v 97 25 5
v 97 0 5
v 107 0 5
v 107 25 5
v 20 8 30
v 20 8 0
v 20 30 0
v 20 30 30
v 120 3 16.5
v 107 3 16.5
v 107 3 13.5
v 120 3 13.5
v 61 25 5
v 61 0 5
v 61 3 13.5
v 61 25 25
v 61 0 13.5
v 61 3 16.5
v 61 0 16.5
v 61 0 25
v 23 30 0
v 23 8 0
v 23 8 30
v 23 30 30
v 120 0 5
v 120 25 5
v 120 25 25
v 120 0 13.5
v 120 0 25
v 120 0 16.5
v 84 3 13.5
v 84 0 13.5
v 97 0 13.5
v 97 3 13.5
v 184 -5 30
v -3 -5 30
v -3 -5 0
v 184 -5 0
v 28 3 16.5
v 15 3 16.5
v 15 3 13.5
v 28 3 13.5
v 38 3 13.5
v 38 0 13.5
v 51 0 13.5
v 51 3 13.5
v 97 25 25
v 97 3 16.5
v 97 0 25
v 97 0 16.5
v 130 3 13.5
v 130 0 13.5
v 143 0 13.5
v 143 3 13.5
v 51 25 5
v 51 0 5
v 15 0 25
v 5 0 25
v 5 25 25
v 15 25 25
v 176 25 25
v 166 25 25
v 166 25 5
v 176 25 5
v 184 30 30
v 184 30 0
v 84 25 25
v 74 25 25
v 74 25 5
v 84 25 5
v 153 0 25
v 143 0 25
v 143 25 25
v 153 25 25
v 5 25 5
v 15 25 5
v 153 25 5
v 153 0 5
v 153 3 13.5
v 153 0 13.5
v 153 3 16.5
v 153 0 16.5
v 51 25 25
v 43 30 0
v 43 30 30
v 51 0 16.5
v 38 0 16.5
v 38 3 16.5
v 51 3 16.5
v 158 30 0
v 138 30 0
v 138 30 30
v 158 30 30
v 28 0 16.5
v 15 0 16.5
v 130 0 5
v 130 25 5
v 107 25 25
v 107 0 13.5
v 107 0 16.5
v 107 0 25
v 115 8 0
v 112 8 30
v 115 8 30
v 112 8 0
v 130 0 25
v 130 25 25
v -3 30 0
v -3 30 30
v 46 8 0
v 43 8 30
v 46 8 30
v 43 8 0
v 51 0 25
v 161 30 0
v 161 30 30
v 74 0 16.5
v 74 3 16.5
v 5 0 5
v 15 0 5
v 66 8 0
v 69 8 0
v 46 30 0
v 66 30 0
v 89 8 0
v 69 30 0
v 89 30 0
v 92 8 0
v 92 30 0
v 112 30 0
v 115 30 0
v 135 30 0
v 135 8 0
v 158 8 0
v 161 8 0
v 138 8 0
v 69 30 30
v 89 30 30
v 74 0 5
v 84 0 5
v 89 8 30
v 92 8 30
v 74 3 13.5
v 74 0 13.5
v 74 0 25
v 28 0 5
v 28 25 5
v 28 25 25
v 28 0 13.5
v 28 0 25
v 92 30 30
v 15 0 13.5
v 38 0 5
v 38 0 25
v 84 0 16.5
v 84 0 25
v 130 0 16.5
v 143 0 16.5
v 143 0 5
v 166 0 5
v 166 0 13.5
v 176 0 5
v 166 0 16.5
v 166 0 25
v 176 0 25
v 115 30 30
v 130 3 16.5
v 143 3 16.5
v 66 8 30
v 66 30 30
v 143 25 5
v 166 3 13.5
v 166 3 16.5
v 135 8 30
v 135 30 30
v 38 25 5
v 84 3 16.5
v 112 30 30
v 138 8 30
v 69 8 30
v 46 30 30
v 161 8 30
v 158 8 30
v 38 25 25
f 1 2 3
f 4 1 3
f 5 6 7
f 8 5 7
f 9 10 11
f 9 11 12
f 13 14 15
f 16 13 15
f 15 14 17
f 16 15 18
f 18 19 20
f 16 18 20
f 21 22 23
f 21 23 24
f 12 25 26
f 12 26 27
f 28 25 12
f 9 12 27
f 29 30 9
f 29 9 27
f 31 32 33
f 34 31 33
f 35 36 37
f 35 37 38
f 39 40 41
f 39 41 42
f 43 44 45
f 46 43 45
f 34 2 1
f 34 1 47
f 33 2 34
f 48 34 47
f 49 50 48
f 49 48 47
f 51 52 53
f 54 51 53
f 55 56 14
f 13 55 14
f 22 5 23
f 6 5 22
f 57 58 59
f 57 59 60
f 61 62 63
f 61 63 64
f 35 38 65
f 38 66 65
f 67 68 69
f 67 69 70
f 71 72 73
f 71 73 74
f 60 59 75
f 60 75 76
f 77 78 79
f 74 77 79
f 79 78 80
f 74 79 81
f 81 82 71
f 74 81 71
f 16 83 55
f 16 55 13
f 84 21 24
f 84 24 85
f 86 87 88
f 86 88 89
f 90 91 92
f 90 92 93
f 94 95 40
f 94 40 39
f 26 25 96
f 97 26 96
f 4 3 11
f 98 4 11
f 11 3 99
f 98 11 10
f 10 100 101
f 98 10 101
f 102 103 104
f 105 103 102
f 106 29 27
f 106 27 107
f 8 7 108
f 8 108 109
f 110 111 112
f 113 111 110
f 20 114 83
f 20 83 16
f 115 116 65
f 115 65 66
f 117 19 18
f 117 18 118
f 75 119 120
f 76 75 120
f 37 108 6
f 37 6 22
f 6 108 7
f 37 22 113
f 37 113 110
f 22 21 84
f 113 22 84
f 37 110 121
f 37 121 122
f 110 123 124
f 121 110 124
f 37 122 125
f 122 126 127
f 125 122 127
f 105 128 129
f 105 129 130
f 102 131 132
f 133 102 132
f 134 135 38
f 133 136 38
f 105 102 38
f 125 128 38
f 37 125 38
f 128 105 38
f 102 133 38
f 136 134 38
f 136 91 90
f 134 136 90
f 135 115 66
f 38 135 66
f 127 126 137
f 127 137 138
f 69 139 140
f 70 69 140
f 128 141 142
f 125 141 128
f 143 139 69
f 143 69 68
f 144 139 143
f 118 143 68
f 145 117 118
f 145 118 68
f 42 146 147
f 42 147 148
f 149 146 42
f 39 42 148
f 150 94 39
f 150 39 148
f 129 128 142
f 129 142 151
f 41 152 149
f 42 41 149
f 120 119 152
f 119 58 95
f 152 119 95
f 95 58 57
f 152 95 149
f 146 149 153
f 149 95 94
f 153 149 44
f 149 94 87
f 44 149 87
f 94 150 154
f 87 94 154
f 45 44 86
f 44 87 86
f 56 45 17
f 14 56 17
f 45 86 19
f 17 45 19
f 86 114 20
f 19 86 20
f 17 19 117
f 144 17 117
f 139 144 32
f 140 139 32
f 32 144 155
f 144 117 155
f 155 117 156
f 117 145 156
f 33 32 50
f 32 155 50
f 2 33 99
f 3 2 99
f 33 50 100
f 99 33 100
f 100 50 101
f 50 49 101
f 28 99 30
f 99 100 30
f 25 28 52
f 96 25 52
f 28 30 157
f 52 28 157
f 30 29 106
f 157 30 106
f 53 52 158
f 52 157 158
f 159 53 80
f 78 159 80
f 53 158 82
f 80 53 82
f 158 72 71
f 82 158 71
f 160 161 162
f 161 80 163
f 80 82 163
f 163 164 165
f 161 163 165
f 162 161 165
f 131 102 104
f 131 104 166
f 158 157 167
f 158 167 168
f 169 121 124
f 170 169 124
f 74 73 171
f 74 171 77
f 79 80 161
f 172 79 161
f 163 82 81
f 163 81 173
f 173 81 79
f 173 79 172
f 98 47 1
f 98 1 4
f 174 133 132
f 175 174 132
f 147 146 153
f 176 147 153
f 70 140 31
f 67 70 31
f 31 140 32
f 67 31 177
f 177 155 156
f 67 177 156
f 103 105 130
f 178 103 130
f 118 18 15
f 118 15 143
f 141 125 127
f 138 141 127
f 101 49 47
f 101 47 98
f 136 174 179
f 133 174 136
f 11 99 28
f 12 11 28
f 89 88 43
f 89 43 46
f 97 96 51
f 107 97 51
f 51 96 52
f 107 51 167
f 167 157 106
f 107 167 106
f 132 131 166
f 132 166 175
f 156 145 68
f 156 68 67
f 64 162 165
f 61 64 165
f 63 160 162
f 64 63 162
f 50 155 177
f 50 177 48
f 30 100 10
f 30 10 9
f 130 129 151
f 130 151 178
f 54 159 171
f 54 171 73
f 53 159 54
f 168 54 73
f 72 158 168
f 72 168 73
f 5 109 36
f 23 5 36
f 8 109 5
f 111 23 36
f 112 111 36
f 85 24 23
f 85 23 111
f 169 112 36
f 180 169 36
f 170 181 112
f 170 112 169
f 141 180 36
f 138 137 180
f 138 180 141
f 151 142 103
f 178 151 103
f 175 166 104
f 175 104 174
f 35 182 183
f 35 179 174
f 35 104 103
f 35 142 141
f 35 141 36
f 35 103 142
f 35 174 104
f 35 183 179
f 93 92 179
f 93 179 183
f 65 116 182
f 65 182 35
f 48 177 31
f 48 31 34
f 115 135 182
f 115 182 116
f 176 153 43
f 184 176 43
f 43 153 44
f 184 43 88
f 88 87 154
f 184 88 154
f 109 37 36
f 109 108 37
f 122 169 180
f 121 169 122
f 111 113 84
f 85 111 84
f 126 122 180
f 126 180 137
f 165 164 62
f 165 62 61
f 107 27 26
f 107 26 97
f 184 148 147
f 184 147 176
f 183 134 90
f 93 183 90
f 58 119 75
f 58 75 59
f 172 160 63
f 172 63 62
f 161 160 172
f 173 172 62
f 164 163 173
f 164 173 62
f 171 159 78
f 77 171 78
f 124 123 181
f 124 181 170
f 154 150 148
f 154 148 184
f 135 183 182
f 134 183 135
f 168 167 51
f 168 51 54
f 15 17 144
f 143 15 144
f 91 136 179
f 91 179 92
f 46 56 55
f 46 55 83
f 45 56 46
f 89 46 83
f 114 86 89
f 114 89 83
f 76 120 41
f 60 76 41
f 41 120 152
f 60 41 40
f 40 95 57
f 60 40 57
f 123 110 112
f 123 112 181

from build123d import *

# Parameters (mm, degrees)
SKETCH1_W           = 20
SKETCH1_H           = 30
BOSS_EXTRUDE1_DEPTH = 30
SKETCH2_W           = 10
SKETCH2_H           = 20
CUT_EXTRUDE1_DEPTH  = 25
SKETCH3_W           = 30
SKETCH3_H           = 8
BOSS_EXTRUDE2_DEPTH = 3
LPATTERN1_COUNT     = 8
LPATTERN1_PITCH     = 23
SKETCH4_W           = 30
SKETCH4_H           = 22
BOSS_EXTRUDE3_DEPTH = 3
SKETCH5_W           = 30
SKETCH5_H           = 30
BOSS_EXTRUDE4_DEPTH = 3
SKETCH6_W           = 151
SKETCH6_H           = 3
CUT_EXTRUDE2_DEPTH  = 3
SKETCH7_W           = 187
SKETCH7_H           = 30
BOSS_EXTRUDE5_DEPTH = 5


with BuildPart() as part:
    # Sketch1 → Boss-Extrude1 (new body)
    with BuildSketch(Plane.XY):
        with Locations((10, 15)):
            Rectangle(SKETCH1_W, SKETCH1_H)
    extrude(amount=BOSS_EXTRUDE1_DEPTH)

    # Sketch2 → Cut-Extrude1 (cut)
    with BuildSketch(Plane.XZ):
        with Locations((10, 15)):
            Rectangle(SKETCH2_W, SKETCH2_H)
    extrude(amount=-CUT_EXTRUDE1_DEPTH, mode=Mode.SUBTRACT)

    # Sketch3 → Boss-Extrude2 (add)
    with BuildSketch(Plane(origin=(20, 0, 0), x_dir=(0, 0, -1), z_dir=(1, 0, 0))):
        with Locations((-15, 4)):
            Rectangle(SKETCH3_W, SKETCH3_H)
    extrude(amount=BOSS_EXTRUDE2_DEPTH)


with BuildPart() as lpattern1_1:
    # LPattern1: pattern copy
    add(part.part.moved(Location(Vector(1, 0, 0) * (1 * LPATTERN1_PITCH))))


with BuildPart() as lpattern1_2:
    # LPattern1: pattern copy
    add(part.part.moved(Location(Vector(1, 0, 0) * (2 * LPATTERN1_PITCH))))


with BuildPart() as lpattern1_3:
    # LPattern1: pattern copy
    add(part.part.moved(Location(Vector(1, 0, 0) * (3 * LPATTERN1_PITCH))))


with BuildPart() as lpattern1_4:
    # LPattern1: pattern copy
    add(part.part.moved(Location(Vector(1, 0, 0) * (4 * LPATTERN1_PITCH))))


with BuildPart() as lpattern1_5:
    # LPattern1: pattern copy
    add(part.part.moved(Location(Vector(1, 0, 0) * (5 * LPATTERN1_PITCH))))


with BuildPart() as lpattern1_6:
    # LPattern1: pattern copy
    add(part.part.moved(Location(Vector(1, 0, 0) * (6 * LPATTERN1_PITCH))))


with BuildPart() as lpattern1_7:
    # LPattern1: pattern copy
    add(part.part.moved(Location(Vector(1, 0, 0) * (7 * LPATTERN1_PITCH))))

    # Combine1: union part, LPattern1_1, LPattern1_2, LPattern1_3, LPattern1_4, LPattern1_5, LPattern1_6
    add(part.part)
    add(lpattern1_1.part)
    add(lpattern1_2.part)
    add(lpattern1_3.part)
    add(lpattern1_4.part)
    add(lpattern1_5.part)
    add(lpattern1_6.part)

    # Sketch4 → Boss-Extrude3 (add)
    with BuildSketch(Plane(origin=(181, 0, 0), x_dir=(0, 0, -1), z_dir=(1, 0, 0))):
        with Locations((-15, 19)):
            Rectangle(SKETCH4_W, SKETCH4_H)
    extrude(amount=BOSS_EXTRUDE3_DEPTH)

    # Sketch5 → Boss-Extrude4 (add)
    with BuildSketch(Plane.ZY):
        with Locations((15, 15)):
            Rectangle(SKETCH5_W, SKETCH5_H)
    extrude(amount=BOSS_EXTRUDE4_DEPTH)

    # Sketch6 → Cut-Extrude2 (cut)
    with BuildSketch(Plane.XZ):
        with Locations((90.5, 15)):
            Rectangle(SKETCH6_W, SKETCH6_H)
    extrude(amount=-CUT_EXTRUDE2_DEPTH, mode=Mode.SUBTRACT)

    # Sketch7 → Boss-Extrude5 (add)
    with BuildSketch(Plane.XZ):
        with Locations((90.5, 15)):
            Rectangle(SKETCH7_W, SKETCH7_H)
    extrude(amount=BOSS_EXTRUDE5_DEPTH)


solid = lpattern1_7.part
